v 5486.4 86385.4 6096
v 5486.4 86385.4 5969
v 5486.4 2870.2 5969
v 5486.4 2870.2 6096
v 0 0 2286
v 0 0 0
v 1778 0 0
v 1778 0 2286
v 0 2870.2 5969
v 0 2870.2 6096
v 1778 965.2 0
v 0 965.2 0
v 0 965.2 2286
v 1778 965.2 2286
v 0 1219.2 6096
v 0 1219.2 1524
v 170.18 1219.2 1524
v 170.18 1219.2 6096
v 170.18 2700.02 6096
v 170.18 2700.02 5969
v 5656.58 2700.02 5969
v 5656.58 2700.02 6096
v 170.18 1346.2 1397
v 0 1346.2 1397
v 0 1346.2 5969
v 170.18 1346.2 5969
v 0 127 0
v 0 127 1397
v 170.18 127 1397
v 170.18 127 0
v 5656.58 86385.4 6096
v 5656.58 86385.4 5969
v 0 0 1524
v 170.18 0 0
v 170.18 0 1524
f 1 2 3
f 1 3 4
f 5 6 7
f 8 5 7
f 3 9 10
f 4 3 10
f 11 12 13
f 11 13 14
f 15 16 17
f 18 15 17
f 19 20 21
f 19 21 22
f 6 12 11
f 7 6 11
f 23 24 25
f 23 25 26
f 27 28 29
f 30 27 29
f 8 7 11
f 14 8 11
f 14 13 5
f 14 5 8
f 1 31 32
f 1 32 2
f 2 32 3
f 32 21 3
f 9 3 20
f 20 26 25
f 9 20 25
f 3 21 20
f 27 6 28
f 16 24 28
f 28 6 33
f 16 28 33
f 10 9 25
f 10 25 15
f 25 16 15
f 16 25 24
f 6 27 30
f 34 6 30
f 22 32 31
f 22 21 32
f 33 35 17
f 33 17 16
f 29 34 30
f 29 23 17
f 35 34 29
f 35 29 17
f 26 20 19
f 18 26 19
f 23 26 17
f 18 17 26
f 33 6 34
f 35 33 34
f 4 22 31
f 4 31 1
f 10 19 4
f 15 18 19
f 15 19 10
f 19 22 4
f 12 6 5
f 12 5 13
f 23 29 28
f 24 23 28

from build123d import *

# Parameters (mm, degrees)
F0_W      = 1778
F0_H      = 965.2
F1_DEPTH  = 2286
F2_W      = 170.18
F2_H      = 127
F3_DEPTH  = 1524
F4_W      = 170.18
F4_H      = 127
F5_DEPTH  = 1219.2
F6_W      = 170.18
F6_H      = 127
F7_DEPTH  = 4572
F8_W      = 170.18
F8_H      = 127
F9_DEPTH  = 1524
F10_W     = 170.18
F10_H     = 127
F11_DEPTH = 5486.4
F12_W     = 170.18
F12_H     = 127
F13_DEPTH = 83515.2


with BuildPart() as f1:
    # F0 (on Top) → F1 (new body)
    with BuildSketch(Plane.XY):
        with Locations((889, 482.6)):
            Rectangle(F0_W, F0_H)
    extrude(amount=F1_DEPTH)


with BuildPart() as f3:
    # F2 (on Top) → F3 (new body)
    with BuildSketch(Plane.XY):
        with Locations((85.09, 63.5)):
            Rectangle(F2_W, F2_H)
    extrude(amount=F3_DEPTH)

    # F4 (on face) → F5 (join)
    with BuildSketch(Plane(origin=(0, 127, 0), x_dir=(-1, 0, 0), z_dir=(0, 1, 0))):
        with Locations((-85.09, 1460.5)):
            Rectangle(F4_W, F4_H)
    extrude(amount=F5_DEPTH)

    # F6 (on face) → F7 (join)
    with BuildSketch(Plane.XY.offset(1524)):
        with Locations((85.09, 1282.7)):
            Rectangle(F6_W, F6_H)
    extrude(amount=F7_DEPTH)

    # F8 (on face) → F9 (join)
    with BuildSketch(Plane(origin=(0, 1346.2, 0), x_dir=(-1, 0, 0), z_dir=(0, 1, 0))):
        with Locations((-85.09, 6032.5)):
            Rectangle(F8_W, F8_H)
    extrude(amount=F9_DEPTH)

    # F10 (on face) → F11 (join)
    with BuildSketch(Plane.YZ.offset(170.18)):
        with Locations((2785.11, 6032.5)):
            Rectangle(F10_W, F10_H)
    extrude(amount=F11_DEPTH)

    # F12 (on face) → F13 (join)
    with BuildSketch(Plane(origin=(0, 2870.2, 0), x_dir=(-1, 0, 0), z_dir=(0, 1, 0))):
        with Locations((-5571.49, 6032.5)):
            Rectangle(F12_W, F12_H)
    extrude(amount=F13_DEPTH)


solid = Compound([f1.part, f3.part])
